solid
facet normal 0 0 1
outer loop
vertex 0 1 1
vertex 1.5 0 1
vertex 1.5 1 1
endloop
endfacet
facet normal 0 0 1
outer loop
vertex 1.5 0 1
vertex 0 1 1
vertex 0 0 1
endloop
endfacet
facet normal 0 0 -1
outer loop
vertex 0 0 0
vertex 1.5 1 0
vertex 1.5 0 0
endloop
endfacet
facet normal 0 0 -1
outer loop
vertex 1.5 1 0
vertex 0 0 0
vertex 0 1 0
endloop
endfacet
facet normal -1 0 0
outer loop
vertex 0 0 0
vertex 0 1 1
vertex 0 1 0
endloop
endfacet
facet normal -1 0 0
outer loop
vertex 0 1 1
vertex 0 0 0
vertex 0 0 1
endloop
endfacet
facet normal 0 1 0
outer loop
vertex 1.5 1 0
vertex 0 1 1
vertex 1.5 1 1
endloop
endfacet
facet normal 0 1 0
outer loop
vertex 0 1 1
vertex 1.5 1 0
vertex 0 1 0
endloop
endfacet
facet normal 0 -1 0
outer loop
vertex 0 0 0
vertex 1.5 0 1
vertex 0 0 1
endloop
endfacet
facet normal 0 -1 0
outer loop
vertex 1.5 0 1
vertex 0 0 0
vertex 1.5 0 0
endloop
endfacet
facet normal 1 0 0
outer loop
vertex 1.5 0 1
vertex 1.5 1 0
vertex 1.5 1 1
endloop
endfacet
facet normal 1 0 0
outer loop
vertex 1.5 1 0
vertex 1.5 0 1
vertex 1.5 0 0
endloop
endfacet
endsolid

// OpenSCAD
// A real Boolean with known1.5mm^3 volume, not a GUI or an empty placeholder.
intersection() {
    difference() {
        cube([2,1,1]);
        translate([1.5,0,0]) cube([1,1,1]);
    }
    cube([3,2,2]);
}
